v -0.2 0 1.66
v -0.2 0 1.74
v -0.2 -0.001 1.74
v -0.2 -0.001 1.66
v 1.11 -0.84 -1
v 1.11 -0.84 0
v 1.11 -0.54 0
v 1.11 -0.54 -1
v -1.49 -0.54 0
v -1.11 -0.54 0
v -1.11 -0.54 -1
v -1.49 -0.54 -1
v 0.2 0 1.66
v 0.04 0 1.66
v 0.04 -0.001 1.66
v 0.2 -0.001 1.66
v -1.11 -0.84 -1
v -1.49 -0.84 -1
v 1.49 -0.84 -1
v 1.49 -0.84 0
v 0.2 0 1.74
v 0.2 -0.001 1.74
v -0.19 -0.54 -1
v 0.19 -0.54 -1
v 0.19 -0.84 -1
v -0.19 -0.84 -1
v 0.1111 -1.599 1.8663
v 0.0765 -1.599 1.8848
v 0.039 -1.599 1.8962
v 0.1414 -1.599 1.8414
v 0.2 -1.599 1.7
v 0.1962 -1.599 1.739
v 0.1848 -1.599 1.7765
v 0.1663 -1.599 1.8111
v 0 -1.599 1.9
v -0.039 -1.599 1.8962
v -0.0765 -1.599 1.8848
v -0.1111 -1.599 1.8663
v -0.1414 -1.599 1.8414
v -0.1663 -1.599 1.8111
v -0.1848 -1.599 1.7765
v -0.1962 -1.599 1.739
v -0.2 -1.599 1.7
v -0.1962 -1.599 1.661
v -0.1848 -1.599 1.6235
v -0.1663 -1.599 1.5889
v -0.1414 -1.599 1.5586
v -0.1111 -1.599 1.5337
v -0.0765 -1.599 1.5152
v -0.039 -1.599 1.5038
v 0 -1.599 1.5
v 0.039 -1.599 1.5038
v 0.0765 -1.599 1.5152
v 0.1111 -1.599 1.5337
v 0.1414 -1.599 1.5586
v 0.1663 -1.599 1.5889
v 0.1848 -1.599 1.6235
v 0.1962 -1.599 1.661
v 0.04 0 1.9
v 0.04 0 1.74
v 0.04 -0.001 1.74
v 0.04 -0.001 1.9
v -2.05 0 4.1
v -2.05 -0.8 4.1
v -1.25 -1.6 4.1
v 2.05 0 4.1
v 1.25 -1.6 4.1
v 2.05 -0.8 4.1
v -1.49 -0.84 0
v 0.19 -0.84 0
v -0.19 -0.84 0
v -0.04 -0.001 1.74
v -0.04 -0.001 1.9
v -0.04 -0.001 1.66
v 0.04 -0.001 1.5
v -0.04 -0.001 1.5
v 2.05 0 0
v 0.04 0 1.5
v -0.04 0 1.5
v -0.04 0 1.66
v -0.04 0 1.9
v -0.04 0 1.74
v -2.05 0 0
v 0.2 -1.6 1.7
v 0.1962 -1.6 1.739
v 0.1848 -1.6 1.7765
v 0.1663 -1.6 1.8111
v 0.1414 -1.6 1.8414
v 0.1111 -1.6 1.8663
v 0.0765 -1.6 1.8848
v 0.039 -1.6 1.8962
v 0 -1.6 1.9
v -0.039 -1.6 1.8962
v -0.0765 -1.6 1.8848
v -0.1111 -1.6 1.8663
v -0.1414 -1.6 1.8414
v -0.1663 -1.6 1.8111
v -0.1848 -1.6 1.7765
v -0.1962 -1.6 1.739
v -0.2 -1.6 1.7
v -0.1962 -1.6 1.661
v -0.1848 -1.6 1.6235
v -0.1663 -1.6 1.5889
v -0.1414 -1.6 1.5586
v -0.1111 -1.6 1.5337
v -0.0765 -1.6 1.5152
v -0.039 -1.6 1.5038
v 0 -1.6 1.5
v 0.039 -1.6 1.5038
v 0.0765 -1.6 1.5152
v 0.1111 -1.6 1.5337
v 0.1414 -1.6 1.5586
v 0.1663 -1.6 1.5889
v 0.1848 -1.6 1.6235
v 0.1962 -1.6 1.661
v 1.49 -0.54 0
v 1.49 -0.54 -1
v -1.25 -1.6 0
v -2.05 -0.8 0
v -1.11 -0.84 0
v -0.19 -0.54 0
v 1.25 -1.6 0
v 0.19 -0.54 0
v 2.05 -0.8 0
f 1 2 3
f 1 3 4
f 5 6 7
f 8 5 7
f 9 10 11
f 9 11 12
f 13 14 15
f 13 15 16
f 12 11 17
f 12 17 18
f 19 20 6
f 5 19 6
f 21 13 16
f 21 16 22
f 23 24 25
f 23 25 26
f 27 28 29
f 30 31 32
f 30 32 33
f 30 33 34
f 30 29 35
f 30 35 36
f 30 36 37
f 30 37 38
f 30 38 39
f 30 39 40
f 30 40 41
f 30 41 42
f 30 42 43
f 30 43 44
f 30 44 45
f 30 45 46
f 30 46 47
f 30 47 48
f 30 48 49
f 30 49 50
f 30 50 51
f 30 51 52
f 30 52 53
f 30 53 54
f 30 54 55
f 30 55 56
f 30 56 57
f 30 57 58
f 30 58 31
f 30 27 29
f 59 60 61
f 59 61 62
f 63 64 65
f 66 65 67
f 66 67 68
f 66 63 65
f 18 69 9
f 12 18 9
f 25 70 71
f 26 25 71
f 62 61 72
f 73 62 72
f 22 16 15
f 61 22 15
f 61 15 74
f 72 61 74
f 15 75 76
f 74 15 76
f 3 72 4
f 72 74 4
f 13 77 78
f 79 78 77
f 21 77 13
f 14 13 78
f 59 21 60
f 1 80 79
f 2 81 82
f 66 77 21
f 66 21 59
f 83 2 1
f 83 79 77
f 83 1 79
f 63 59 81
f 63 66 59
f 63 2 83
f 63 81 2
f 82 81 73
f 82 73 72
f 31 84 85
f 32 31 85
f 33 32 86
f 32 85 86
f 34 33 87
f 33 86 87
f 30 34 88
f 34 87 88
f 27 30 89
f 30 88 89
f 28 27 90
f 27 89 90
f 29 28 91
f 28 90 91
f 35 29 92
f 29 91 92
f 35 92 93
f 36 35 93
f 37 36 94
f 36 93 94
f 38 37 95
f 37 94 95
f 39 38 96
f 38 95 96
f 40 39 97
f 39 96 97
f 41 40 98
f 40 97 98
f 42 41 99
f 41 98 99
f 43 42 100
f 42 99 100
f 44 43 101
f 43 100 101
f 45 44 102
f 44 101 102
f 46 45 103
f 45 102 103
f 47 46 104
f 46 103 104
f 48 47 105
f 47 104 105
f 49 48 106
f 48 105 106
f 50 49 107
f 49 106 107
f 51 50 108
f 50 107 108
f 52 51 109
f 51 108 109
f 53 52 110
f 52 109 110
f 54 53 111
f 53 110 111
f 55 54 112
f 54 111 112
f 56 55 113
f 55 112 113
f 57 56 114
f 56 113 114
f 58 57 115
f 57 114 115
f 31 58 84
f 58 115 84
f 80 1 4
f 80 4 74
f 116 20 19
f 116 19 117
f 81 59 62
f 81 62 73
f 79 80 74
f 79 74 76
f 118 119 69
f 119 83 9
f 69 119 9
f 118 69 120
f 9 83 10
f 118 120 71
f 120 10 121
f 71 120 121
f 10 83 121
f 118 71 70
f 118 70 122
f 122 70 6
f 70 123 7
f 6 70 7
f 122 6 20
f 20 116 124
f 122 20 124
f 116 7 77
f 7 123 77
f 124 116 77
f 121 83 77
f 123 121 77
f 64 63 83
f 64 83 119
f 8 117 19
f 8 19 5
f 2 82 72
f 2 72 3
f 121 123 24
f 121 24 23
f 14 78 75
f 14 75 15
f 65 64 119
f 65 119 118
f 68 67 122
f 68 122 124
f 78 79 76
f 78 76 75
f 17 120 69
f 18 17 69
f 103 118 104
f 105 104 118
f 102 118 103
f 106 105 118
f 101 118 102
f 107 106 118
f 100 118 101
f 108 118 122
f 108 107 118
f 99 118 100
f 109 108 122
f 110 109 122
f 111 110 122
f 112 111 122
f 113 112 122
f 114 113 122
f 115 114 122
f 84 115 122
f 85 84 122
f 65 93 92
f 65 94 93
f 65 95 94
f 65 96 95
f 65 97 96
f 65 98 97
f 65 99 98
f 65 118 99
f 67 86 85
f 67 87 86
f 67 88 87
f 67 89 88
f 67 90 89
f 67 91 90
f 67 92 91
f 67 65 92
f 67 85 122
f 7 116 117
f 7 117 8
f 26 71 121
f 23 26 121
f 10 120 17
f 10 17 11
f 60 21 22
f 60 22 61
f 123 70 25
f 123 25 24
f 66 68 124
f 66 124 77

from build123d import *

# Parameters (mm, degrees)
BOITIER_DEPTH           = 4.1
ESQUISSE2_W             = 0.38
ESQUISSE2_H             = 0.3
PIN2_DEPTH              = 1
ESQUISSE3_W             = 0.38
ESQUISSE3_H             = 0.3
PIN3_DEPTH              = 1
ESQUISSE4_W             = 0.38
ESQUISSE4_H             = 0.3
PIN1_DEPTH              = 1
ESQUISSE5_R             = 0.2
ENL_V_MAT_EXTRU_1_DEPTH = 0.001
ENL_V_MAT_EXTRU_4_DEPTH = 0.001


with BuildPart() as part:
    # Esquisse1 → Boitier (new body)
    with BuildSketch(Plane.XY.offset(4.1)):
        Polygon((-2.05, -0.8), (-1.25, -1.6), (1.25, -1.6), (2.05, -0.8), (2.05, 0), (-2.05, 0), align=None)
    extrude(amount=-BOITIER_DEPTH)

    # Esquisse2 → Pin2 (add)
    with BuildSketch(Plane(origin=(0, 0, 0), x_dir=(-1, 0, 0), z_dir=(0, 0, -1))):
        with Locations((0, -0.69)):
            Rectangle(ESQUISSE2_W, ESQUISSE2_H)
    extrude(amount=PIN2_DEPTH)

    # Esquisse3 → Pin3 (add)
    with BuildSketch(Plane(origin=(0, 0, 0), x_dir=(-1, 0, 0), z_dir=(0, 0, -1))):
        with Locations((-1.3, -0.69)):
            Rectangle(ESQUISSE3_W, ESQUISSE3_H)
    extrude(amount=PIN3_DEPTH)

    # Esquisse4 → Pin1 (add)
    with BuildSketch(Plane(origin=(0, 0, 0), x_dir=(-1, 0, 0), z_dir=(0, 0, -1))):
        with Locations((1.3, -0.69)):
            Rectangle(ESQUISSE4_W, ESQUISSE4_H)
    extrude(amount=PIN1_DEPTH)

    # Esquisse5 → Enlèv. mat.-Extru.1 (cut)
    with BuildSketch(Plane.XZ.offset(1.6)):
        with Locations((0, 1.7)):
            Circle(ESQUISSE5_R)
    extrude(amount=-ENL_V_MAT_EXTRU_1_DEPTH, mode=Mode.SUBTRACT)

    # Esquisse6 → Enlèv. mat.-Extru.4 (cut)
    with BuildSketch(Plane(origin=(0, 0, 0), x_dir=(1, 0, 0), z_dir=(0, 1, 0))):
        Polygon((-0.2, -1.66), (-0.04, -1.66), (-0.04, -1.5), (0.04, -1.5), (0.04, -1.66), (0.2, -1.66), (0.2, -1.74), (0.04, -1.74), (0.04, -1.9), (-0.04, -1.9), (-0.04, -1.74), (-0.2, -1.74), align=None)
    extrude(amount=-ENL_V_MAT_EXTRU_4_DEPTH, mode=Mode.SUBTRACT)


solid = part.part
